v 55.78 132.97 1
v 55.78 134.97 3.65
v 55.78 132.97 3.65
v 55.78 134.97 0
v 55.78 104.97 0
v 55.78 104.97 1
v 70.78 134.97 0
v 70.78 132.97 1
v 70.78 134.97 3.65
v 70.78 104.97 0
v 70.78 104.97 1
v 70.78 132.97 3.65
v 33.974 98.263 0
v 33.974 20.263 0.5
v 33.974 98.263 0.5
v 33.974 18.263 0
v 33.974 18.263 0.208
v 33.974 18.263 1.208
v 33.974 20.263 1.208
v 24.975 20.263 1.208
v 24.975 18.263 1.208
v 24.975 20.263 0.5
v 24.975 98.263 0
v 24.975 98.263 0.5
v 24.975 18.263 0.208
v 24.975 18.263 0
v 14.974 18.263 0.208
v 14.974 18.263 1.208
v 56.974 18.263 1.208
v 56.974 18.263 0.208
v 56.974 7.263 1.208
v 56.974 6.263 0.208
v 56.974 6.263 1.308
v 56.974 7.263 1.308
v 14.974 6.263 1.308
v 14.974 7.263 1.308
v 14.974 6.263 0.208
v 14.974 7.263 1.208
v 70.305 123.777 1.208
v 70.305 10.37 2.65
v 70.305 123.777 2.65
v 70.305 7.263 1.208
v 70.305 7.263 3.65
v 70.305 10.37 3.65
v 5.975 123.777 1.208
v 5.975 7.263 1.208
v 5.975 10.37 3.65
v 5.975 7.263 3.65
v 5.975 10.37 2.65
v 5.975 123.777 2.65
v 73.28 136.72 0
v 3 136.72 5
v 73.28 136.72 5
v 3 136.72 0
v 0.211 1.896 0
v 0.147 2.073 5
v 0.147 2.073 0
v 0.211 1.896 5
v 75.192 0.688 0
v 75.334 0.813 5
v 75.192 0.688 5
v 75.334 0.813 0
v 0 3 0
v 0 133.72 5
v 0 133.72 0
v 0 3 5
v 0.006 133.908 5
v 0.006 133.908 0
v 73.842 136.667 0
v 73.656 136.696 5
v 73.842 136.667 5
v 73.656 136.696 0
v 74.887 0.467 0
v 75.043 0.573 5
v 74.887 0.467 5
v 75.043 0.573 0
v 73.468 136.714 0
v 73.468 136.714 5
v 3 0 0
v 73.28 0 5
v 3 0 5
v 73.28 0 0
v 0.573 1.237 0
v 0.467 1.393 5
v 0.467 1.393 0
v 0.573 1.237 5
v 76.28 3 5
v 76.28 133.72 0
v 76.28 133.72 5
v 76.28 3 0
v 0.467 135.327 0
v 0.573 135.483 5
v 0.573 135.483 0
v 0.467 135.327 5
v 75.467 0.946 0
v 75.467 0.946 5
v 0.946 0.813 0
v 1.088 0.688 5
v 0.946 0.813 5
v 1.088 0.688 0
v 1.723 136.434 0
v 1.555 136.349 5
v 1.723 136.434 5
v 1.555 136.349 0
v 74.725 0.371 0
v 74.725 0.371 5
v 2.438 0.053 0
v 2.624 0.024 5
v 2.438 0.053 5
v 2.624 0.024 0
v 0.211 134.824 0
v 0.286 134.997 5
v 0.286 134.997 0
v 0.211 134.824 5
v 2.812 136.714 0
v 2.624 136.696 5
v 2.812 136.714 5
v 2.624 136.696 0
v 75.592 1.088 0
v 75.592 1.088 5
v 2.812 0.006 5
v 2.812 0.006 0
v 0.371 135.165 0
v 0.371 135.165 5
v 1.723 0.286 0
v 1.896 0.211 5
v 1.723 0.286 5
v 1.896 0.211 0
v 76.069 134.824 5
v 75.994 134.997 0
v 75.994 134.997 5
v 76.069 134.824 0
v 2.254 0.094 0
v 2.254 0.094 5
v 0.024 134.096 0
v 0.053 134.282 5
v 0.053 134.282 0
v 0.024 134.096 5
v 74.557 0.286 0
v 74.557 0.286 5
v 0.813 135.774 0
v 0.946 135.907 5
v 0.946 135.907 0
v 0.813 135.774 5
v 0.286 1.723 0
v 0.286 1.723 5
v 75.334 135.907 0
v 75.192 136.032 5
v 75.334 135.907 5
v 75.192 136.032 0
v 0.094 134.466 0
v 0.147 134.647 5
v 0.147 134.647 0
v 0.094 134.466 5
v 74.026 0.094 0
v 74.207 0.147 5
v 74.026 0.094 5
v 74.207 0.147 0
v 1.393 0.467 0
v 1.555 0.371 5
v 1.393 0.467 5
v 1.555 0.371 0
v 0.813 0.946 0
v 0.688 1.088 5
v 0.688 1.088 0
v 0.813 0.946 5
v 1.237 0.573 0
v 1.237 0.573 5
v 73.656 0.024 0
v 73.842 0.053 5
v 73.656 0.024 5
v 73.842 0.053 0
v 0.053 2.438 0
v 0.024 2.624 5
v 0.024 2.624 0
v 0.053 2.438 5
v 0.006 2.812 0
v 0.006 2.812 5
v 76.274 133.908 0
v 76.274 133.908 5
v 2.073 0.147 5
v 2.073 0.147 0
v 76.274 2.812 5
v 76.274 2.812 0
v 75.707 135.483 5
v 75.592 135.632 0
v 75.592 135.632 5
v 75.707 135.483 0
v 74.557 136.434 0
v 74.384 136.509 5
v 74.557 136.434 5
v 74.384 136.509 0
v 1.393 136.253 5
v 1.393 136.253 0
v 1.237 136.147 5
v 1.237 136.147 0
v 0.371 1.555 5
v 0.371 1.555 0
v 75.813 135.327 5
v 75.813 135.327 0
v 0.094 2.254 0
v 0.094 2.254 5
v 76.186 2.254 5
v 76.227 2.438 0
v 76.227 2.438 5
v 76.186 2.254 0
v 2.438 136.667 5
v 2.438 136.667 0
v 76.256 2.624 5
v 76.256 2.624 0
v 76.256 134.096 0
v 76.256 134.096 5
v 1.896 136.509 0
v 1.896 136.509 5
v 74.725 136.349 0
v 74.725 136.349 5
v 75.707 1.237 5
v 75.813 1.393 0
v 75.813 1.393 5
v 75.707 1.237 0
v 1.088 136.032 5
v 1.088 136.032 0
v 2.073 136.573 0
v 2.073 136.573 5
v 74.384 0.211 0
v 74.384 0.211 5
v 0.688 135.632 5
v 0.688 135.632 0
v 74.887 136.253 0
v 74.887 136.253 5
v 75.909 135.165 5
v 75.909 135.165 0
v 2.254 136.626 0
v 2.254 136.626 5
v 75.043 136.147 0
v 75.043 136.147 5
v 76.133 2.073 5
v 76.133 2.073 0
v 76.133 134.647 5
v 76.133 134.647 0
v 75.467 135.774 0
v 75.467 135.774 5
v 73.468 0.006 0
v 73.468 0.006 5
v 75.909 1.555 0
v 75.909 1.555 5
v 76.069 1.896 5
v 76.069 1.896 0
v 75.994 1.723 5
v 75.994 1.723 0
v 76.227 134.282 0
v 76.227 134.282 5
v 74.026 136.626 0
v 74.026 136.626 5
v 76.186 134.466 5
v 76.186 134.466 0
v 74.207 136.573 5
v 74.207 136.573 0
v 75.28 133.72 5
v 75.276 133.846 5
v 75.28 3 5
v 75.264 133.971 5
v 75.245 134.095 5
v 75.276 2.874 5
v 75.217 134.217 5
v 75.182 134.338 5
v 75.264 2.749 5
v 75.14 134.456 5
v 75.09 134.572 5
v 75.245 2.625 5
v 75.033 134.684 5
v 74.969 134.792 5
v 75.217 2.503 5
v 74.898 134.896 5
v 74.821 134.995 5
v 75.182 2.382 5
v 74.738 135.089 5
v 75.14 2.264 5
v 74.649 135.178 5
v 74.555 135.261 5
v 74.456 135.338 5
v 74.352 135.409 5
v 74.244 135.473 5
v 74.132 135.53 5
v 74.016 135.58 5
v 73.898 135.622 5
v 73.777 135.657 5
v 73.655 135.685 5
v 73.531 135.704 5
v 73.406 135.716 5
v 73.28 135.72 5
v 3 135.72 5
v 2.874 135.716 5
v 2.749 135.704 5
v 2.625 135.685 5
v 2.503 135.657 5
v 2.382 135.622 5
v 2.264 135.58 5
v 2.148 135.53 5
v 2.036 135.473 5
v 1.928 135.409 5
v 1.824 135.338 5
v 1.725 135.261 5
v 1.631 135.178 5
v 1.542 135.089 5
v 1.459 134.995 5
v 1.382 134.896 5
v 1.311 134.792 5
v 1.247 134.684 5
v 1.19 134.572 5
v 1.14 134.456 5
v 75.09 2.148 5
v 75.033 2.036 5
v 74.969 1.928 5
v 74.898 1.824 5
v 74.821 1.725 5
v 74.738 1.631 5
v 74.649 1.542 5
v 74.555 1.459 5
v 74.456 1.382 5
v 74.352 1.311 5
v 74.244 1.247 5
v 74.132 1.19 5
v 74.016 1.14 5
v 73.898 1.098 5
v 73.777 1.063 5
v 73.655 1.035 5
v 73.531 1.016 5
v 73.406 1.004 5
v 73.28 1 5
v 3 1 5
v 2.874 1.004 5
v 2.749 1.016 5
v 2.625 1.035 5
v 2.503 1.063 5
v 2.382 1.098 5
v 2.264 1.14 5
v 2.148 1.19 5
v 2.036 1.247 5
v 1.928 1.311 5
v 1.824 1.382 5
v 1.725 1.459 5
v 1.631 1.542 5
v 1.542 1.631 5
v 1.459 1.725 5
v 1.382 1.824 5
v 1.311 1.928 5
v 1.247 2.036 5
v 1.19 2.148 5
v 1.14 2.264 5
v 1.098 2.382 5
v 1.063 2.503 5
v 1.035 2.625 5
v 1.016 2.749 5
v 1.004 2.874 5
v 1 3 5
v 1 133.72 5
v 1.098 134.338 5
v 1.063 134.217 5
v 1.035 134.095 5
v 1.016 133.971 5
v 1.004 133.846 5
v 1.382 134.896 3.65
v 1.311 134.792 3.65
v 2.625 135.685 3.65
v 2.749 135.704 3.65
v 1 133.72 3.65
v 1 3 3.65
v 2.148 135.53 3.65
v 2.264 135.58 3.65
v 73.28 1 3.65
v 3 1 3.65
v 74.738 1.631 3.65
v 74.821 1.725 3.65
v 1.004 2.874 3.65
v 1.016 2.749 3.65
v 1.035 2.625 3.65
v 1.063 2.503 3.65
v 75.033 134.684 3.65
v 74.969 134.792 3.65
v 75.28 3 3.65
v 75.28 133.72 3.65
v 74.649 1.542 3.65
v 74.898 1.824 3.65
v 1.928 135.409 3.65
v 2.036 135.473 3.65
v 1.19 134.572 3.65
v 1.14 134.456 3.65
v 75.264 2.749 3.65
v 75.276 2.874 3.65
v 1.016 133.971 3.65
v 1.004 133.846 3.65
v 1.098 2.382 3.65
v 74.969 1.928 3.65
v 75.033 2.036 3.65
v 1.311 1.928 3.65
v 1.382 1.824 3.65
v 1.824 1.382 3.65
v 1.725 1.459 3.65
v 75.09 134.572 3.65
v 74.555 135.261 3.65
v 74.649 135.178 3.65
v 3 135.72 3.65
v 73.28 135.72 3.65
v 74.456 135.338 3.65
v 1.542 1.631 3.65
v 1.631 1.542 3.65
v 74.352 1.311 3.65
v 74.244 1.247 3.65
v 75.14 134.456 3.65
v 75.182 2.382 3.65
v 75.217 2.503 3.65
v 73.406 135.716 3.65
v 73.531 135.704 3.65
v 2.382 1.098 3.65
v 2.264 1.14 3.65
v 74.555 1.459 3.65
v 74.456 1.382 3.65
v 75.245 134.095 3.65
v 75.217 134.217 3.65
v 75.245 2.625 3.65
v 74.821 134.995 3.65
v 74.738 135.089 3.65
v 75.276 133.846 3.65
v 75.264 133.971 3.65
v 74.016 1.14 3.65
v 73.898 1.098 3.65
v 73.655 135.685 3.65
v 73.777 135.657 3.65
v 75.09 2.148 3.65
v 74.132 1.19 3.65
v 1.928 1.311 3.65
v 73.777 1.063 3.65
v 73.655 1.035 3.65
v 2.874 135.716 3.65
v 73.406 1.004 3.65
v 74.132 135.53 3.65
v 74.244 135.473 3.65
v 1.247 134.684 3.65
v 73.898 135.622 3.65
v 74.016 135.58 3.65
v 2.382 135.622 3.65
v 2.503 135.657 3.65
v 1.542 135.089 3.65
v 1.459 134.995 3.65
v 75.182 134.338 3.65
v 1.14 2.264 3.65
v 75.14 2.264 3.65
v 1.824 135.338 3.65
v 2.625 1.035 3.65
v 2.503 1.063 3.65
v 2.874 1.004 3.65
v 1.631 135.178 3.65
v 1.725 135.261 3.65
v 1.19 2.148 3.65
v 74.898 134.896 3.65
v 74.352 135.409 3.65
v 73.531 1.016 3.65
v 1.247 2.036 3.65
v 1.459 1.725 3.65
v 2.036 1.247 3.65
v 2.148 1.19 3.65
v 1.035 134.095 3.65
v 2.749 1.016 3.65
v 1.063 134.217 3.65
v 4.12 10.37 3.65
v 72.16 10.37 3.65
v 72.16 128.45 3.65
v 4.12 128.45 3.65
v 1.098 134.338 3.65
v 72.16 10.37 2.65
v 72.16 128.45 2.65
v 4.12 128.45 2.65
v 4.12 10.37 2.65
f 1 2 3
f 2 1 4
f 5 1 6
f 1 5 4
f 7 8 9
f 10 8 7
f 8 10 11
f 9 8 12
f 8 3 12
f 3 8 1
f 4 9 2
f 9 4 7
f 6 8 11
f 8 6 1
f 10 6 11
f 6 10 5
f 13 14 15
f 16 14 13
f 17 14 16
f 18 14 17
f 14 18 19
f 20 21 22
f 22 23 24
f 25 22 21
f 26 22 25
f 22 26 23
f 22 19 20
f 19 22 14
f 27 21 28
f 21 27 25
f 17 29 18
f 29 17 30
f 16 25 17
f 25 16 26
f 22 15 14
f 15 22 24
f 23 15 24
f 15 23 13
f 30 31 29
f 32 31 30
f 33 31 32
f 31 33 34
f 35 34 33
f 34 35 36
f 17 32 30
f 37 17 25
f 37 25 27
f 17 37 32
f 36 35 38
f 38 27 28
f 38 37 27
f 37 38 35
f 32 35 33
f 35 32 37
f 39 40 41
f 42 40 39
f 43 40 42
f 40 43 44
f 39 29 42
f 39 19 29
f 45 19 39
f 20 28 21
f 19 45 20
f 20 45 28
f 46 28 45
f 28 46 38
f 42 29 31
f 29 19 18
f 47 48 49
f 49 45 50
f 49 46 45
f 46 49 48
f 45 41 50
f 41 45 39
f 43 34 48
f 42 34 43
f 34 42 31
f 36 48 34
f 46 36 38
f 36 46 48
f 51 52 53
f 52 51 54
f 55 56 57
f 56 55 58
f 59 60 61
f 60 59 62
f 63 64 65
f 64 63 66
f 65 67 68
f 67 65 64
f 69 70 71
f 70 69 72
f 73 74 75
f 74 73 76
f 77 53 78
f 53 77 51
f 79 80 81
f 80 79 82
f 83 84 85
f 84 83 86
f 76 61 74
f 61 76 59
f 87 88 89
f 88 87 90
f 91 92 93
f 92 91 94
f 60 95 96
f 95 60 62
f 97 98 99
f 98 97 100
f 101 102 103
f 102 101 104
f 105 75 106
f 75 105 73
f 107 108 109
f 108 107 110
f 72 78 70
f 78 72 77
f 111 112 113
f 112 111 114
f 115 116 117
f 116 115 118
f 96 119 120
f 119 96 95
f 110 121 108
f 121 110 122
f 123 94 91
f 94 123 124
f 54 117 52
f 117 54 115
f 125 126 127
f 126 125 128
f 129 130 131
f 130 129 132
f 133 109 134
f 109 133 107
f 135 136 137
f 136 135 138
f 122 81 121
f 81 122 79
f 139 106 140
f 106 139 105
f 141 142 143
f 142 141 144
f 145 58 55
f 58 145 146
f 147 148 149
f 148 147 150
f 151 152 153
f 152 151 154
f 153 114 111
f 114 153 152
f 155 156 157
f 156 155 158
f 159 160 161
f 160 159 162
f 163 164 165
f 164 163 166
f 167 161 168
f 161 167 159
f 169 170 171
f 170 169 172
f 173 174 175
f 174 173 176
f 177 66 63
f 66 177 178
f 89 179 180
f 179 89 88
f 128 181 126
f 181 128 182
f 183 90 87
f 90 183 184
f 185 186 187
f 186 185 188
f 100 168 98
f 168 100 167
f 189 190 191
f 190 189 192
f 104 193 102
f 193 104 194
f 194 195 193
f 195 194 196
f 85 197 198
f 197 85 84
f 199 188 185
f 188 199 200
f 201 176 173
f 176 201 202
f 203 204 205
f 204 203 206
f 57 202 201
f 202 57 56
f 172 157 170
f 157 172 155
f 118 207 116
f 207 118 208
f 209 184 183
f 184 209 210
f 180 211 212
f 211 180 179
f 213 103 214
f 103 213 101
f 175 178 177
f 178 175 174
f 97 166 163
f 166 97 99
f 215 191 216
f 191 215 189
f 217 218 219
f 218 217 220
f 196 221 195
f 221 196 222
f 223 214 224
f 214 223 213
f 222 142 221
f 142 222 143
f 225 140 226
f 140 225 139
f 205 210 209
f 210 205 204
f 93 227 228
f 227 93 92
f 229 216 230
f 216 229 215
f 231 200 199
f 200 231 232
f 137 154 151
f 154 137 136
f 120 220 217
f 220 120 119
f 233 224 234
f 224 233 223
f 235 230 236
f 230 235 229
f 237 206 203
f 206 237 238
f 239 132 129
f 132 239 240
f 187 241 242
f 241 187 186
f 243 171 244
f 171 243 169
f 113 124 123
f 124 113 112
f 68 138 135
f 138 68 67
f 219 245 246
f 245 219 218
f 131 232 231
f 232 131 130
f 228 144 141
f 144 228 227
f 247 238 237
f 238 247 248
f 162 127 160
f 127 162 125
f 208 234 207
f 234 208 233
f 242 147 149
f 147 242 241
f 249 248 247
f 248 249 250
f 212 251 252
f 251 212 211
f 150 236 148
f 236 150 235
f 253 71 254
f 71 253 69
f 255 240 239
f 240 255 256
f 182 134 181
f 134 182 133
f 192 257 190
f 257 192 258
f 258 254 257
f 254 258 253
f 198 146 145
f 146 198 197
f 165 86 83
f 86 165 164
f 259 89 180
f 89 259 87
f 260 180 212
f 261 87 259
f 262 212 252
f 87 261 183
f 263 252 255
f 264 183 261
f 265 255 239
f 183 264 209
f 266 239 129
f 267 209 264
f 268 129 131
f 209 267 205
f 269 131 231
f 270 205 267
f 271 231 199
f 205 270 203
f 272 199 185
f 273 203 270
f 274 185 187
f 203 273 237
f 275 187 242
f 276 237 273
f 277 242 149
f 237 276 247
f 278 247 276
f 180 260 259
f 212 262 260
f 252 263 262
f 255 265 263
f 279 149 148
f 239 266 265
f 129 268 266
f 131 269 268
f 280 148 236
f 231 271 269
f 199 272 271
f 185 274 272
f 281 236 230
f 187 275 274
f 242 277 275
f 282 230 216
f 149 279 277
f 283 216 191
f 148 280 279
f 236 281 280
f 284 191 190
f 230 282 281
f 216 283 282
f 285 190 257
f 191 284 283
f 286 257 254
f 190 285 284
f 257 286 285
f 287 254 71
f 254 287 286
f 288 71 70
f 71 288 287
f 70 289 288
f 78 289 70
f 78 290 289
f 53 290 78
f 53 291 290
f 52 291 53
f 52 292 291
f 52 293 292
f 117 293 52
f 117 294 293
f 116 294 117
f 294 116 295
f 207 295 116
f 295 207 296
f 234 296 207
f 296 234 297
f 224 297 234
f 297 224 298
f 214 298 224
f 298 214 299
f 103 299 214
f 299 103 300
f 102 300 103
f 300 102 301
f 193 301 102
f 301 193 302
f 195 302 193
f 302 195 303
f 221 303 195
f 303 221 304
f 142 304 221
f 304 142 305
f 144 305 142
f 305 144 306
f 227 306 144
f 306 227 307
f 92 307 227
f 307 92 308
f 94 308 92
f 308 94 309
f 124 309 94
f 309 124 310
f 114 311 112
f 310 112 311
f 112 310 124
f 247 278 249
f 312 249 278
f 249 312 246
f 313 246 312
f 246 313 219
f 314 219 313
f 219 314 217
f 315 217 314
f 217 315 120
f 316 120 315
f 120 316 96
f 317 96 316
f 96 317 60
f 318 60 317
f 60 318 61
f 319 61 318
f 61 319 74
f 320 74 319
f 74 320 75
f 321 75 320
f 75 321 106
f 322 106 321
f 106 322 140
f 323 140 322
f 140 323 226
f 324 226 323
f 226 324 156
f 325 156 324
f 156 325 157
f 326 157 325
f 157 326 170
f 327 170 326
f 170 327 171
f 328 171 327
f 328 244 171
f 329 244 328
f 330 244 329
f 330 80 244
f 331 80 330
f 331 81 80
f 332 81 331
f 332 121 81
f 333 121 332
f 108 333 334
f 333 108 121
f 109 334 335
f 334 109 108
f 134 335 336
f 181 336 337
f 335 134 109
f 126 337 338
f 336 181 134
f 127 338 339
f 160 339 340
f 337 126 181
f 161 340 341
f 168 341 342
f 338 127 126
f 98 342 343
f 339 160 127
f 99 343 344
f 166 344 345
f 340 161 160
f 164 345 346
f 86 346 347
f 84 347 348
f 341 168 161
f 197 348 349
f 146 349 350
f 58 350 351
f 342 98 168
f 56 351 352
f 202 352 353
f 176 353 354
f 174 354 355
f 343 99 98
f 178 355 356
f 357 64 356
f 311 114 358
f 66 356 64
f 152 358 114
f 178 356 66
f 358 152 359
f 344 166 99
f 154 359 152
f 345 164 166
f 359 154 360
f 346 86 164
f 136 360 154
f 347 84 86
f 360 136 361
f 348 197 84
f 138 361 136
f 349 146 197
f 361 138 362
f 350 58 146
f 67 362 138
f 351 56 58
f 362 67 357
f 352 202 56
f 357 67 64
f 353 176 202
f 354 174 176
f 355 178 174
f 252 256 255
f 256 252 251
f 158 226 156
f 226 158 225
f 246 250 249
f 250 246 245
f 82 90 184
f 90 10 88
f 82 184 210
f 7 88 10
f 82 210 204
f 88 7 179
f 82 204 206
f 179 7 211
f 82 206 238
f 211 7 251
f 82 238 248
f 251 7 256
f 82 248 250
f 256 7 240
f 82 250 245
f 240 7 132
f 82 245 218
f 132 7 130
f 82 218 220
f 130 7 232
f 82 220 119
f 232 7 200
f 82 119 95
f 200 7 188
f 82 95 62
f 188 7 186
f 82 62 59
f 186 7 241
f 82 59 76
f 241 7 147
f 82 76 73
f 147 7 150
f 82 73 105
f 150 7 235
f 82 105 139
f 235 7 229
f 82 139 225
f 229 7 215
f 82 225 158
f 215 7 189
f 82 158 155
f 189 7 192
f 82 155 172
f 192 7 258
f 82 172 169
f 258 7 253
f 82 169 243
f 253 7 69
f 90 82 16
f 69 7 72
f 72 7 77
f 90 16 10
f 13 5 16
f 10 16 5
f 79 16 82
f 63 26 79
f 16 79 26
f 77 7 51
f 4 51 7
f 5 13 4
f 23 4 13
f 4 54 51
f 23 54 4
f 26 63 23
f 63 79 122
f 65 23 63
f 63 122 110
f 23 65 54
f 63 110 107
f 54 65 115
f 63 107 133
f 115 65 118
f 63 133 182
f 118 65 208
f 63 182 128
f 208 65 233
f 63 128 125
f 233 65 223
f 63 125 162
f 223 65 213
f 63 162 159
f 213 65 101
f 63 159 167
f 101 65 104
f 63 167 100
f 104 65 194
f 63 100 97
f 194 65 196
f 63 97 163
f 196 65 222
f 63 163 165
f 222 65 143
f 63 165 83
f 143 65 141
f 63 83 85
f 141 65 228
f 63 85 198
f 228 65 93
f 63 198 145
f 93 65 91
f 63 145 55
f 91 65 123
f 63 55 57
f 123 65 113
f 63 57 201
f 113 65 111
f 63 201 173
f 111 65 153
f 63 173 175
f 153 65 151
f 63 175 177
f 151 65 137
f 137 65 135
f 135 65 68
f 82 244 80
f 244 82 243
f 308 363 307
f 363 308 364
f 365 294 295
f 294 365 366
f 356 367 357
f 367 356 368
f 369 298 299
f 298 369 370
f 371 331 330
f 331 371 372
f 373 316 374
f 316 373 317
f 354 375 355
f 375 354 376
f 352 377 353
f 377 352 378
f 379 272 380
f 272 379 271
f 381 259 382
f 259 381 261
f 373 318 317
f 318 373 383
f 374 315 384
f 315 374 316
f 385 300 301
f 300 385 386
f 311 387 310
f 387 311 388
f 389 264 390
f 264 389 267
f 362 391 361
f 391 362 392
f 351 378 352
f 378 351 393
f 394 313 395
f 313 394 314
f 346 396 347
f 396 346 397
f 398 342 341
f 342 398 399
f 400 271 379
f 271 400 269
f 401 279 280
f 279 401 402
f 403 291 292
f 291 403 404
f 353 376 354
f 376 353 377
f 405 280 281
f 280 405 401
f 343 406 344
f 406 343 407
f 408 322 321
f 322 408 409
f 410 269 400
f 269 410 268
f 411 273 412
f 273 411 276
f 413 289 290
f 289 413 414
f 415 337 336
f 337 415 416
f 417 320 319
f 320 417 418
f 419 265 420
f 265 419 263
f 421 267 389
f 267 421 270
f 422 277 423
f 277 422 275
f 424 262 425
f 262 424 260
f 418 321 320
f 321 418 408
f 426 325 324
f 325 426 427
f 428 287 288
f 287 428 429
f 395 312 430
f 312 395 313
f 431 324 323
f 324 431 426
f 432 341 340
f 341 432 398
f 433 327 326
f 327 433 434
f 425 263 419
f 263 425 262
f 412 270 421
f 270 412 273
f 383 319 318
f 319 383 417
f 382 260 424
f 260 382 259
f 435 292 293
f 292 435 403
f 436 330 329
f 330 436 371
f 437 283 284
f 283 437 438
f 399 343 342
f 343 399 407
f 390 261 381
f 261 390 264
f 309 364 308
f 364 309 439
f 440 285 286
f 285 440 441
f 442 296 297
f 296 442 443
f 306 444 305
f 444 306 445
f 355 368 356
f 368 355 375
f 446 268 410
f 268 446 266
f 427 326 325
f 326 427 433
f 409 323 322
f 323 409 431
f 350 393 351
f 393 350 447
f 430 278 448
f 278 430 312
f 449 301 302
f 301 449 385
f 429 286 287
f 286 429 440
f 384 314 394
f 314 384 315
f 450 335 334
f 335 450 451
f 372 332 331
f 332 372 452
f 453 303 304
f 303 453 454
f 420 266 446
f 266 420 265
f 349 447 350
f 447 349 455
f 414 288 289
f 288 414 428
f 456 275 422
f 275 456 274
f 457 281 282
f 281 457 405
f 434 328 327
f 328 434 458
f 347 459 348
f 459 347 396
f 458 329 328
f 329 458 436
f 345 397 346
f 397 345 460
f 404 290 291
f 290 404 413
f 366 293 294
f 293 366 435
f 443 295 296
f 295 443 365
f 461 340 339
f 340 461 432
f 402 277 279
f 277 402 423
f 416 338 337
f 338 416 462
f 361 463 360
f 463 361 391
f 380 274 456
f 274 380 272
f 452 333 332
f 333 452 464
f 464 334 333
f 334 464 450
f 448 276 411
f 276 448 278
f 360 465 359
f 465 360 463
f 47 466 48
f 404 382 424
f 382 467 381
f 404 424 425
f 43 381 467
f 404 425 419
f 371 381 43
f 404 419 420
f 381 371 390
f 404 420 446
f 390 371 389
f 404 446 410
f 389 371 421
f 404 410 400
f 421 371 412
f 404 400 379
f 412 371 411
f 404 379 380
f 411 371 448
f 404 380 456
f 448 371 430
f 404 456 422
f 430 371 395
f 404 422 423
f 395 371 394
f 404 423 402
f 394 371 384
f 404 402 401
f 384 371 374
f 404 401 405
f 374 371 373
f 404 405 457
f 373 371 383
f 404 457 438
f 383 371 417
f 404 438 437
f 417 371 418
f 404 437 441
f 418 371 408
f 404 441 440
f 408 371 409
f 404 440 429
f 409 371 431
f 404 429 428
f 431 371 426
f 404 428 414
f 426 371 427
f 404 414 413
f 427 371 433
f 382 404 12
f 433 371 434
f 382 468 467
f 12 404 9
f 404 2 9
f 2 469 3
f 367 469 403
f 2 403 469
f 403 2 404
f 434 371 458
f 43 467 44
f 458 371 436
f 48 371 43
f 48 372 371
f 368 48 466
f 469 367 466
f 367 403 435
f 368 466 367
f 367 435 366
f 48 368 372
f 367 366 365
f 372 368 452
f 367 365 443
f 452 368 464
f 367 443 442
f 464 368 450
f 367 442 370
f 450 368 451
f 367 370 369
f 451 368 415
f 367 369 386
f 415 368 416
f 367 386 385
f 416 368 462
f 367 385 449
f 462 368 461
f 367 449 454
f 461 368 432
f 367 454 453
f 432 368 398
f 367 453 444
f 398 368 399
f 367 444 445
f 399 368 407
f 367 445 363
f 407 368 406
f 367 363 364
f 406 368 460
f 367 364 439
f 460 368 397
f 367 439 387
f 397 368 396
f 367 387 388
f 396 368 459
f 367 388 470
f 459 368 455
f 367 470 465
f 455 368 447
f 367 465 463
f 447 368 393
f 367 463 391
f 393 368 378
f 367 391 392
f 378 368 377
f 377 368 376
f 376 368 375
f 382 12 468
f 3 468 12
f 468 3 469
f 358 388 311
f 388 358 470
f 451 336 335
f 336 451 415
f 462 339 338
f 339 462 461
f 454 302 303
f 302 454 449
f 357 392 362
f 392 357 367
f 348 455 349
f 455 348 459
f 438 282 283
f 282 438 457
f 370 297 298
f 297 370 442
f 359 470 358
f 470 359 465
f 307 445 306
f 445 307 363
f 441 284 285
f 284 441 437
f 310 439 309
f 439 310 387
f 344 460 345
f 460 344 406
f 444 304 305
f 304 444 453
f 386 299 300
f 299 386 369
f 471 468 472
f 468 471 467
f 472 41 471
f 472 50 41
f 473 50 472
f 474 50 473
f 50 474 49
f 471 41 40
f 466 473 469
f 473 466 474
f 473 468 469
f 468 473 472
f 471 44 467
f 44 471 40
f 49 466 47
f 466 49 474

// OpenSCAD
wall_thick = 2;
total_height = 5;
lens_radius = 2;
lens_size = [74.14,134.58,1.1+0.25]+[0.140,0.140,0];
touch_size = [66.04,116.08,0.7]+[2,2,0.3];
touch_offset = [0,1.05,0]; //positive axis direction
touch_cable_offset = [4.5,0.75,0]; // negative axis direction (cable in crnr furthest from orig)
touch_cable_size = [15,2,0]; // z ignored, equal to bezel size
touch_cable_recess = [15,30,1.0]+[0,0,0.1];
screen_size = [64.191, 116.374, 1.213+0.229]+[0.14,0.14,0];
screen_offset = [0,-3.89,0]; // positive axis direction
screen_bend_size = [42,12,1];
screen_bend_offset = [9,-1,0]; // relative to corner of screen, z from size
screen_cable_width = [9,2,0]; // z ignored
screen_cable_offset = [10,0,0]; //relative to upper left edge of bend
screen_cable_recess = [9,80,0.5];

// derived
$fn =100;
z_eps = [0,0,0.1];
bezel_radius = lens_radius+wall_thick/2;
bezel_size = [lens_size[0], lens_size[1], 0]+[wall_thick, wall_thick, total_height];

module rounded_cube(v,r){
hull(){
            for(i = [0,1]){
                for(j = [0,1]){
                    // shrink by radius
                    k = i == 0 ? 1 : -1; 
                    l = j == 0 ? 1 : -1;
                    translate([v[0]*i+r*k, v[1]*j+r*l,0])
            cylinder(r=r,h=v[2]);
                }
            }
        }
    }

difference(){
    union(){
        // bezel
        rounded_cube(bezel_size, bezel_radius);
    }
    //lens
    translate((bezel_size-lens_size)/2+[0,0,(bezel_size[2]-lens_size[2])/2])
        rounded_cube(lens_size+[0,0,0.1], lens_radius);
    //touch sensor
    translate([(bezel_size[0]-touch_size[0])/2,
                      (bezel_size[1]-touch_size[1])/2,
                       bezel_size[2]-lens_size[2]-touch_size[2]]
                     +touch_offset)
        cube(touch_size+z_eps);
    //touch cable hole
    translate(bezel_size-[(bezel_size[0]-lens_size[0])/2,
                                           (bezel_size[1]-lens_size[1])/2,
                                            bezel_size[2]+0.1]-touch_cable_offset)
        rotate([0,0,180]){
            // hole
            cube(touch_cable_size+[0,0,bezel_size[2]]+z_eps*2);
            //recess
            cube(touch_cable_recess);
        }
    //screen
    translate([(bezel_size[0]-screen_size[0])/2,
                      (bezel_size[1]-screen_size[1])/2,
                       bezel_size[2]-lens_size[2]-touch_size[2]-screen_size[2]]
                     +touch_offset+screen_offset){
        //screen
        cube(screen_size+z_eps+[0,0,total_height]);
        // screen bend
        translate(screen_bend_offset-[0,0,screen_bend_size[2]]){
             cube(screen_bend_size+z_eps);
            translate([0,screen_bend_size[1],
                            -bezel_size[2]+lens_size[2]+touch_size[2]+screen_size[2]+screen_bend_size[2]-0.1]
                            +screen_cable_offset){
                cube(screen_cable_width+[0,0,bezel_size[2]]+z_eps);
                cube(screen_cable_recess+z_eps);
                            }
                     }
                 }
}
